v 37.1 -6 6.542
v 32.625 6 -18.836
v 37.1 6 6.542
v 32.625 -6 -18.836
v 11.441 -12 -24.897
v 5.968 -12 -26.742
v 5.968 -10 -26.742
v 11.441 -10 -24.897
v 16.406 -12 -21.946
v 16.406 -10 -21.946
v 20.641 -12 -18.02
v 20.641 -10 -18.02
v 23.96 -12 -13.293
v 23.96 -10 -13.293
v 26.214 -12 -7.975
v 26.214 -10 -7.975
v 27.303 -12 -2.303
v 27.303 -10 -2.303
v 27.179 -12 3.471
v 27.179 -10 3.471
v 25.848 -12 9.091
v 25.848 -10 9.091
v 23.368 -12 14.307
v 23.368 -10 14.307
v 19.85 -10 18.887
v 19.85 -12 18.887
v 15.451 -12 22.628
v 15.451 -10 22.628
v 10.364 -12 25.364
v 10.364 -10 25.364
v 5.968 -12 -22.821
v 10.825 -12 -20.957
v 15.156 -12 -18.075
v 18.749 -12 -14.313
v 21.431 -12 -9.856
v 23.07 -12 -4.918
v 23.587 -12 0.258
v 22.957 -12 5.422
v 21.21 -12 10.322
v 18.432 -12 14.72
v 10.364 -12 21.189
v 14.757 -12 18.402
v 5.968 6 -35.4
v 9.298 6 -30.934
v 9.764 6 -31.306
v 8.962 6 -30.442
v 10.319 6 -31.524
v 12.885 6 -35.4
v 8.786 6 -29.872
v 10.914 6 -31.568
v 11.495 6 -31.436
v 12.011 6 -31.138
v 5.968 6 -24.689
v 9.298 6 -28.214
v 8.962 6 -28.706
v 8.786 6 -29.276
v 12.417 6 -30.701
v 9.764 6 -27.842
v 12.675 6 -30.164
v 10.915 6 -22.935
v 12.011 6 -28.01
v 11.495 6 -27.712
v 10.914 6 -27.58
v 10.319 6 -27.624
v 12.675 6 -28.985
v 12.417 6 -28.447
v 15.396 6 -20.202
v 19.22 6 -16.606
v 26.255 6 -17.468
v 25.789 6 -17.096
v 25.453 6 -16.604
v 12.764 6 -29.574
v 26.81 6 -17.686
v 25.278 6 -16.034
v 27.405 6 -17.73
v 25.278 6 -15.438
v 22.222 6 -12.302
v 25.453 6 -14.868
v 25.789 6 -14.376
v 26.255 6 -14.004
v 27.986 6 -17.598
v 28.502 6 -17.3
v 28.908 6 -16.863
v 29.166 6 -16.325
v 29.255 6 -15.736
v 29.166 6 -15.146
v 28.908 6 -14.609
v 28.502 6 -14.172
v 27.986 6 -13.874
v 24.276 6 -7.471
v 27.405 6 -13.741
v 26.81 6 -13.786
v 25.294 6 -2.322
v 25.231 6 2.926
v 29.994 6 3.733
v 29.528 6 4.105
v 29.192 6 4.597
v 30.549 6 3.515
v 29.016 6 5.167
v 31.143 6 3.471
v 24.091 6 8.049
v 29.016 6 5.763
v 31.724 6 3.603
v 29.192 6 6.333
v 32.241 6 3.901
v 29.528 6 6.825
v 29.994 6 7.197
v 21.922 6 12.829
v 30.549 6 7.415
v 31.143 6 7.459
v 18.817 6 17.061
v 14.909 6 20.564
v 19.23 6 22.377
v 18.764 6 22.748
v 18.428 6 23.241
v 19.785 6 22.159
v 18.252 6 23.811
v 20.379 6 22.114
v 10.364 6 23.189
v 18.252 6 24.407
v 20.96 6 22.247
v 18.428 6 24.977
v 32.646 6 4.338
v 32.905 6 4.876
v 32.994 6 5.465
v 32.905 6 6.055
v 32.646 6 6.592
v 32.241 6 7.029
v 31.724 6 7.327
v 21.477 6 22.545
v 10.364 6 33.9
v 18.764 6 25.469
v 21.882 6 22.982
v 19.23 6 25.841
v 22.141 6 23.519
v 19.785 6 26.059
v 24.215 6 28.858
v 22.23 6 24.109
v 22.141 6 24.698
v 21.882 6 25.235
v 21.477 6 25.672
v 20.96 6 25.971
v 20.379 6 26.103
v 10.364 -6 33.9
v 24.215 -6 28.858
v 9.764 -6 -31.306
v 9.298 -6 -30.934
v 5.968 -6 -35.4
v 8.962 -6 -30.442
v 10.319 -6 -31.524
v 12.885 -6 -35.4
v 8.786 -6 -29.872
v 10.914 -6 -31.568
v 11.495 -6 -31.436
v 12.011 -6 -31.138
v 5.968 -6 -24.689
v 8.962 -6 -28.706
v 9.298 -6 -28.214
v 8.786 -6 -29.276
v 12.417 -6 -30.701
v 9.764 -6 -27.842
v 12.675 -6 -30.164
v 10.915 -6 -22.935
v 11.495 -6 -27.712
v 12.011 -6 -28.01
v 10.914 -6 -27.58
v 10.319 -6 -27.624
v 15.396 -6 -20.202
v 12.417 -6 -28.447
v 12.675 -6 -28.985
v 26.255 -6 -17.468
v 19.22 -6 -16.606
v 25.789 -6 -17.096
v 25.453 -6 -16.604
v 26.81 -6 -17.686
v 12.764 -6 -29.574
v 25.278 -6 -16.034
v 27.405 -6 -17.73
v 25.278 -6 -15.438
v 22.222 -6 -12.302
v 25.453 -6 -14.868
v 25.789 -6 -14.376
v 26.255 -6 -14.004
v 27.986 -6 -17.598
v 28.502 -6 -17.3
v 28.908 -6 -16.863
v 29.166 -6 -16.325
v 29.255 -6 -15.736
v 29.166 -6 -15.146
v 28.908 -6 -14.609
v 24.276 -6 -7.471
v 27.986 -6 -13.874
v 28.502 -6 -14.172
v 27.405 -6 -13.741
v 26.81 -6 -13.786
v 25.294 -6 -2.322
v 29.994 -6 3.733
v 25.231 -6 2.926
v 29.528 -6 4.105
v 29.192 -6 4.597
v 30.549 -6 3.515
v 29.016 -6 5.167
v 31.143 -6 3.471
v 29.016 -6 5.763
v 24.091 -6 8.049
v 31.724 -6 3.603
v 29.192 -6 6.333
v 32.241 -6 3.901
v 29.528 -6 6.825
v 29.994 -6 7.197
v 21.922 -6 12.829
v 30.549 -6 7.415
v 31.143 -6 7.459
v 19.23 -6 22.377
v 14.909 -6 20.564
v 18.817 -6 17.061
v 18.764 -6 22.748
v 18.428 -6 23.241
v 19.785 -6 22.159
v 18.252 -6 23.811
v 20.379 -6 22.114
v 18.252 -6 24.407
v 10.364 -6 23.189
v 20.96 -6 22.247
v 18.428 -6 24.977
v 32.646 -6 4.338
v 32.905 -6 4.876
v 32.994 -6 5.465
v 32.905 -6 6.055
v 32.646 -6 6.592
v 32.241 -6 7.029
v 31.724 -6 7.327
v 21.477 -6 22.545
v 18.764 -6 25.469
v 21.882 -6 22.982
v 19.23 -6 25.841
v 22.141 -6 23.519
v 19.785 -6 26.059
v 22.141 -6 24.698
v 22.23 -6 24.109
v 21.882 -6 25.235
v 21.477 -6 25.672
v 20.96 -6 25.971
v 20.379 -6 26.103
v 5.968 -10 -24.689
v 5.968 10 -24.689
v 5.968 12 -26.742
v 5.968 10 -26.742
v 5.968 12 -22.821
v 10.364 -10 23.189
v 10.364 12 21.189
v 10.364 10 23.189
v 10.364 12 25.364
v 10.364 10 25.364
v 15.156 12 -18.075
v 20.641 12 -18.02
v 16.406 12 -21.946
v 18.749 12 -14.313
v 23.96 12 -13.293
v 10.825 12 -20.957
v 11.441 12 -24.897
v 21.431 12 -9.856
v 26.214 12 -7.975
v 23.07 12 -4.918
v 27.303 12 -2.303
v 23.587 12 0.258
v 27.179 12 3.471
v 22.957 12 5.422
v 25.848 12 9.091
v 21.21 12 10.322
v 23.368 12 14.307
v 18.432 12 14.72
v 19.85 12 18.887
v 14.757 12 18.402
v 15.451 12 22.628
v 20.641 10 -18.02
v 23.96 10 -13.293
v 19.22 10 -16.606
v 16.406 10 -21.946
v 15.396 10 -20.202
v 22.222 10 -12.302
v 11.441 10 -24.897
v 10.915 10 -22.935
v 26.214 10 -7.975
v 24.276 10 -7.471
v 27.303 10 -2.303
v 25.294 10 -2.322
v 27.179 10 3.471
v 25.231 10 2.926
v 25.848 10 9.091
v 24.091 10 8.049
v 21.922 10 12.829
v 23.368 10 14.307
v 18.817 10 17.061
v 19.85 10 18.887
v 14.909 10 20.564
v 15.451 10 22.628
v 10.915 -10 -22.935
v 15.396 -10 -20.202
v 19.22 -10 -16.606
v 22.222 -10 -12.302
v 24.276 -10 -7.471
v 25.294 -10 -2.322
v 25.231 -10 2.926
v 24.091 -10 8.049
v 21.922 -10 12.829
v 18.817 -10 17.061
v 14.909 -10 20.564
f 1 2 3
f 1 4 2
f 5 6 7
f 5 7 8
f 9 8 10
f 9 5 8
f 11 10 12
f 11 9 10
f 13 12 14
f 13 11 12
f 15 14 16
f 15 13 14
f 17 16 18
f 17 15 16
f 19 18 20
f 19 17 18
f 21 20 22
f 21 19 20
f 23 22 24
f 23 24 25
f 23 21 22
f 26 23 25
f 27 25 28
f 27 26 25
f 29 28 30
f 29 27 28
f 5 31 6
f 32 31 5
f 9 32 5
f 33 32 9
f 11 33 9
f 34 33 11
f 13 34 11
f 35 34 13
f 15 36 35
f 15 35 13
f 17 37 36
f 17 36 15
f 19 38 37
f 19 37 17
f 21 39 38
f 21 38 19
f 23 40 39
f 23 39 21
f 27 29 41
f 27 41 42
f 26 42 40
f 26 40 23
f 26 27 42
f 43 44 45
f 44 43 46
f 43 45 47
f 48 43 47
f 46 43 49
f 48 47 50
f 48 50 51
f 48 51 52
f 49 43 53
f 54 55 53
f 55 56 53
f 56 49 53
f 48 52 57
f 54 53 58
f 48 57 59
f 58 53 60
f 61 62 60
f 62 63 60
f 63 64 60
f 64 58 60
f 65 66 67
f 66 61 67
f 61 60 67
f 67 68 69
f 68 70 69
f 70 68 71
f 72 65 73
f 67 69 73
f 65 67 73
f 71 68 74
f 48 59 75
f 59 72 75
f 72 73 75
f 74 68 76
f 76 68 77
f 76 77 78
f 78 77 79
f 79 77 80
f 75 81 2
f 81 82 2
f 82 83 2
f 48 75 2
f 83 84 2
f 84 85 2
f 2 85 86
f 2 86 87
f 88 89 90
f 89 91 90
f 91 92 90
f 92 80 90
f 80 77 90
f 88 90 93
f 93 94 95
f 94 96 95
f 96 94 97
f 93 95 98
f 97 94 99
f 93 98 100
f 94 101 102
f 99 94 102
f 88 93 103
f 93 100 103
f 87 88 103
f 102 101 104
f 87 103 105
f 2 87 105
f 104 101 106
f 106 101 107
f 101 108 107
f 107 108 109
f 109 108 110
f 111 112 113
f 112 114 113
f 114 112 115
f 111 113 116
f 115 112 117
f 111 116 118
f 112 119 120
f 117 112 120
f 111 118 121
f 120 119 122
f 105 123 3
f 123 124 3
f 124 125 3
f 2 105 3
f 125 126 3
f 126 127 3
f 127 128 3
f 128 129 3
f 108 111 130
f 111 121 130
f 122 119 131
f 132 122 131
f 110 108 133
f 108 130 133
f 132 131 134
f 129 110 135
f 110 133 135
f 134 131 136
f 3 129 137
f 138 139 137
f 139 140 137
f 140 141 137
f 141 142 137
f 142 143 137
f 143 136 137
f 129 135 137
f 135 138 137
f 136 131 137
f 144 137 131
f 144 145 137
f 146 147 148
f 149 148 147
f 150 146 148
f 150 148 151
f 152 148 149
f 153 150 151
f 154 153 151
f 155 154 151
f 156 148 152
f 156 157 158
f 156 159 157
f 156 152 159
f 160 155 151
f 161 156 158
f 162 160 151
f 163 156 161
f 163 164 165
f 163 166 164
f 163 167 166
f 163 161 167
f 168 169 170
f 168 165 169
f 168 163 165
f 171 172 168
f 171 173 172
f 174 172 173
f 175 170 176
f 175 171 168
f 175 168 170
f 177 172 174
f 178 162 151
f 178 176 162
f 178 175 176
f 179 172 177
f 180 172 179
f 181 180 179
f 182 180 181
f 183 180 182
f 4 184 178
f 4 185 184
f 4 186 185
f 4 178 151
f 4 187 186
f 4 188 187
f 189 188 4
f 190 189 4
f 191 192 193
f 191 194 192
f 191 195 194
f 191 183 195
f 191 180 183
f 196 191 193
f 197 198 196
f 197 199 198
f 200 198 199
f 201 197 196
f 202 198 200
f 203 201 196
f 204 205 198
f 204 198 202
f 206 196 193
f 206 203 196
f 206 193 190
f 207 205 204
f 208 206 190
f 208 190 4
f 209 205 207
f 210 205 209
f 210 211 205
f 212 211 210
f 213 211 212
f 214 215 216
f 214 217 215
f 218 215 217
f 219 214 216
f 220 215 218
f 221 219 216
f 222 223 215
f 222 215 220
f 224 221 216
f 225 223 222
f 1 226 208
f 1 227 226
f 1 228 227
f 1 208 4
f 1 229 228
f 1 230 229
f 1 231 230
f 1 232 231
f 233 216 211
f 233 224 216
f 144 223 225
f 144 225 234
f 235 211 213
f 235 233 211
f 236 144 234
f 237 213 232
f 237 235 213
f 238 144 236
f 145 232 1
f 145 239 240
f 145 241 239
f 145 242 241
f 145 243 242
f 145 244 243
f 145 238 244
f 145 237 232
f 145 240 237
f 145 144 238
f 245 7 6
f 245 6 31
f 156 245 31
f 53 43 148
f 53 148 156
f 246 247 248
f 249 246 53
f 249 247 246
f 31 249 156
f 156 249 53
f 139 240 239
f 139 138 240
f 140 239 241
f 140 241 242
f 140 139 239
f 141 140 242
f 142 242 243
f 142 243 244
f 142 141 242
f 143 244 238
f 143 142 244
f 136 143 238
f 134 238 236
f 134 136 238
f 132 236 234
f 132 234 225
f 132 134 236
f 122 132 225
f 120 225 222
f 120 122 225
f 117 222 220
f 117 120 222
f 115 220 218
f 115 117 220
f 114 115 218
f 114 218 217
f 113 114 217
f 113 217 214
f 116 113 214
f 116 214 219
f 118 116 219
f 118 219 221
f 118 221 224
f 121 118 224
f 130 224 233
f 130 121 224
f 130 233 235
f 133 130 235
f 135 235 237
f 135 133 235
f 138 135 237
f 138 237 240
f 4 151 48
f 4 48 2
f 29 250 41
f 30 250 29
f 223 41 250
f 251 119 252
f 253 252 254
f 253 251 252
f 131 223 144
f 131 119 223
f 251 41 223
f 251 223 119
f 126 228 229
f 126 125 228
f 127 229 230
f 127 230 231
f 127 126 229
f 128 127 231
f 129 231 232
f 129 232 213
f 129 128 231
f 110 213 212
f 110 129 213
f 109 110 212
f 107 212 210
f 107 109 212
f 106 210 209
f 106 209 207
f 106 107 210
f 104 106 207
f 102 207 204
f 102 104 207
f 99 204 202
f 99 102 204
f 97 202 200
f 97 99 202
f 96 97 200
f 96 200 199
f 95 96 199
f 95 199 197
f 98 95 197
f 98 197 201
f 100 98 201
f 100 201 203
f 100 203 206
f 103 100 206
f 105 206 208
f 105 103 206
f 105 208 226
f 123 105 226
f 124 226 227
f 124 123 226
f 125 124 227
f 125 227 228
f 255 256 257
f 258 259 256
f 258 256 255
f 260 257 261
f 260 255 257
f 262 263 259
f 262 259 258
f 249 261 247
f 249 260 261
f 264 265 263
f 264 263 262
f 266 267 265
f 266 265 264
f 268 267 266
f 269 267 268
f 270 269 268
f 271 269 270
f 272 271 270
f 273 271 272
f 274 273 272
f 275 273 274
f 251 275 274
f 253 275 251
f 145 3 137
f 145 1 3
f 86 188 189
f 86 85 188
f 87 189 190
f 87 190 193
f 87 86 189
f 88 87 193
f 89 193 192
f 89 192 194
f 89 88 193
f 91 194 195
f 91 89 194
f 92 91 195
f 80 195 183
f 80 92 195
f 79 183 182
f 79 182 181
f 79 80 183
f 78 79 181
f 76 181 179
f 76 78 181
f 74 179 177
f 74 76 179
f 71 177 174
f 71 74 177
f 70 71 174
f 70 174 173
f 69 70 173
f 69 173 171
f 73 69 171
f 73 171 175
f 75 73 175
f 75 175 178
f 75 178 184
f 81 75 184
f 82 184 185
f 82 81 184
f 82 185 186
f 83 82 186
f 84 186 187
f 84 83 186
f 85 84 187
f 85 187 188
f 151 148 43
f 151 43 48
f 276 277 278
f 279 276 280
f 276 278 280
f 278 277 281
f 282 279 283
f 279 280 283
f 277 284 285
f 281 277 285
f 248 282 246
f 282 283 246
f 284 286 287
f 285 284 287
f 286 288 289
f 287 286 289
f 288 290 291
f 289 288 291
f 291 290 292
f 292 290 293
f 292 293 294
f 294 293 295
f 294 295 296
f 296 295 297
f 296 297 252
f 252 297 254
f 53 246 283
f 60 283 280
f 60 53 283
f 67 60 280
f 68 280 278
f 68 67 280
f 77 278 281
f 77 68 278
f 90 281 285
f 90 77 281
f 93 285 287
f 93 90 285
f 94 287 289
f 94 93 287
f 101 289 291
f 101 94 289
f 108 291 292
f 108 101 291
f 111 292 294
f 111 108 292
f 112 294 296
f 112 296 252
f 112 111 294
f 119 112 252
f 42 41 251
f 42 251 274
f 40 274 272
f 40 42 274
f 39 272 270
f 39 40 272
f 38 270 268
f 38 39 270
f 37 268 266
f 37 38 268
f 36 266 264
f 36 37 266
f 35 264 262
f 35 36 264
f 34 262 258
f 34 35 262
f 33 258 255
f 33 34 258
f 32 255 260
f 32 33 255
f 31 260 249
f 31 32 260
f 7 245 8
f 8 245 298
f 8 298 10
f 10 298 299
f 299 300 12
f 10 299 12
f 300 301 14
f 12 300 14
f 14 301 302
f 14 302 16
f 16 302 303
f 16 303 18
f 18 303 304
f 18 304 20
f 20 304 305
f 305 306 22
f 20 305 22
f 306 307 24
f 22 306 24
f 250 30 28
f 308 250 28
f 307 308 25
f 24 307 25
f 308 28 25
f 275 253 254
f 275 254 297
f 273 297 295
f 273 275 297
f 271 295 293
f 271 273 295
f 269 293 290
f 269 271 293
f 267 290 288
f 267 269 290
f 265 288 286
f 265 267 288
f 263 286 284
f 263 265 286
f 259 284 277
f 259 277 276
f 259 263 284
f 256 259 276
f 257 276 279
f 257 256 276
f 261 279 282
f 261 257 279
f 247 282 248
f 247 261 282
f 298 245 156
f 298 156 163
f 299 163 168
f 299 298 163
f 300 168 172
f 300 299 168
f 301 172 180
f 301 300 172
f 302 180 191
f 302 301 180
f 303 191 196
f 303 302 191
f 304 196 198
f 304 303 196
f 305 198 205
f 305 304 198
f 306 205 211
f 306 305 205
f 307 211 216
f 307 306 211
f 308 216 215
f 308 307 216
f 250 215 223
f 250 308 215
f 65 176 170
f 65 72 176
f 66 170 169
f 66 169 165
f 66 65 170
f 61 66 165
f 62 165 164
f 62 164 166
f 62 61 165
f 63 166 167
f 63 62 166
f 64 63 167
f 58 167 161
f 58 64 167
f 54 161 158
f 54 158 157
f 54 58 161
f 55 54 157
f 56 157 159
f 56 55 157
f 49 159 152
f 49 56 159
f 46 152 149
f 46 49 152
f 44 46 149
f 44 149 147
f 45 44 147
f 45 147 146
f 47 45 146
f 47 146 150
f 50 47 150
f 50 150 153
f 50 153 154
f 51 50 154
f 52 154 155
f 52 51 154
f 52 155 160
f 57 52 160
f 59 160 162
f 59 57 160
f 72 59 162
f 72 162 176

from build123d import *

# Parameters (mm, degrees)
F0_R     = 2
F1_DEPTH = 6
F2_DEPTH = 12
F4_DEPTH = 2
F6_DEPTH = 2


with BuildPart() as f1:
    # F0 (on Front) → F1 (new body, symmetric)
    with BuildSketch(Plane.XZ):
        with BuildLine():
            Line((24.215026, 28.858344), (10.364281, 33.899603))
            Line((10.364281, 33.899603), (10.364281, 25.364181))
            ThreePointArc((10.364281, 25.364181), (27.303004, -2.303471), (5.968233, -26.742105))
            Line((5.968233, -26.742105), (5.968233, -35.4))
            Line((5.968233, -35.4), (12.884546, -35.4))
            Line((12.884546, -35.4), (32.624816, -18.835947))
            Line((32.624816, -18.835947), (37.099572, 6.541656))
            Line((37.099572, 6.541656), (24.215026, 28.858344))
        make_face()
        with Locations((10.764081, -29.574071)):
            Circle(F0_R, mode=Mode.SUBTRACT)
        with Locations((27.255351, -15.735884)):
            Circle(F0_R, mode=Mode.SUBTRACT)
        with Locations((20.229663, 24.108774)):
            Circle(F0_R, mode=Mode.SUBTRACT)
        with Locations((30.993642, 5.465015)):
            Circle(F0_R, mode=Mode.SUBTRACT)
        with BuildLine():
            ThreePointArc((5.968233, -26.742105), (27.303004, -2.303471), (10.364281, 25.364181))
            Line((10.364281, 25.364181), (10.364281, 23.189258))
            ThreePointArc((10.364281, 23.189258), (25.293606, -2.322395), (5.968233, -24.688868))
            Line((5.968233, -24.688868), (5.968233, -26.742105))
        make_face()
    extrude(amount=F1_DEPTH, both=True)

    # F0 (on Front) → F2 (join, symmetric)
    with BuildSketch(Plane.XZ):
        with BuildLine():
            ThreePointArc((5.968233, -24.688868), (25.293606, -2.322395), (10.364281, 23.189258))
            Line((10.364281, 23.189258), (10.364281, 21.189258))
            ThreePointArc((10.364281, 21.189258), (23.471393, -2.344502), (5.968233, -22.820674))
            Line((5.968233, -22.820674), (5.968233, -24.688868))
        make_face()
    extrude(amount=F2_DEPTH, both=True)

    # F3 (on face) → F4 (join)
    with BuildSketch(Plane.XZ.offset(12)):
        with BuildLine():
            Line((5.968233, -24.688868), (5.968233, -26.742105))
            ThreePointArc((5.968233, -26.742105), (27.303004, -2.303471), (10.364281, 25.364181))
            Line((10.364281, 25.364181), (10.364281, 23.189258))
            ThreePointArc((10.364281, 23.189258), (25.293606, -2.322395), (5.968233, -24.688868))
        make_face()
    extrude(amount=-F4_DEPTH)

    # F5 (on face) → F6 (join)
    with BuildSketch(Plane(origin=(0, 12, 0), x_dir=(-1, 0, 0), z_dir=(0, 1, 0))):
        with BuildLine():
            ThreePointArc((-10.364281, 25.364181), (-27.303004, -2.303471), (-5.968233, -26.742105))
            Line((-5.968233, -26.742105), (-5.968233, -24.688868))
            ThreePointArc((-5.968233, -24.688868), (-25.293606, -2.322395), (-10.364281, 23.189258))
            Line((-10.364281, 23.189258), (-10.364281, 25.364181))
        make_face()
    extrude(amount=-F6_DEPTH)


solid = f1.part
